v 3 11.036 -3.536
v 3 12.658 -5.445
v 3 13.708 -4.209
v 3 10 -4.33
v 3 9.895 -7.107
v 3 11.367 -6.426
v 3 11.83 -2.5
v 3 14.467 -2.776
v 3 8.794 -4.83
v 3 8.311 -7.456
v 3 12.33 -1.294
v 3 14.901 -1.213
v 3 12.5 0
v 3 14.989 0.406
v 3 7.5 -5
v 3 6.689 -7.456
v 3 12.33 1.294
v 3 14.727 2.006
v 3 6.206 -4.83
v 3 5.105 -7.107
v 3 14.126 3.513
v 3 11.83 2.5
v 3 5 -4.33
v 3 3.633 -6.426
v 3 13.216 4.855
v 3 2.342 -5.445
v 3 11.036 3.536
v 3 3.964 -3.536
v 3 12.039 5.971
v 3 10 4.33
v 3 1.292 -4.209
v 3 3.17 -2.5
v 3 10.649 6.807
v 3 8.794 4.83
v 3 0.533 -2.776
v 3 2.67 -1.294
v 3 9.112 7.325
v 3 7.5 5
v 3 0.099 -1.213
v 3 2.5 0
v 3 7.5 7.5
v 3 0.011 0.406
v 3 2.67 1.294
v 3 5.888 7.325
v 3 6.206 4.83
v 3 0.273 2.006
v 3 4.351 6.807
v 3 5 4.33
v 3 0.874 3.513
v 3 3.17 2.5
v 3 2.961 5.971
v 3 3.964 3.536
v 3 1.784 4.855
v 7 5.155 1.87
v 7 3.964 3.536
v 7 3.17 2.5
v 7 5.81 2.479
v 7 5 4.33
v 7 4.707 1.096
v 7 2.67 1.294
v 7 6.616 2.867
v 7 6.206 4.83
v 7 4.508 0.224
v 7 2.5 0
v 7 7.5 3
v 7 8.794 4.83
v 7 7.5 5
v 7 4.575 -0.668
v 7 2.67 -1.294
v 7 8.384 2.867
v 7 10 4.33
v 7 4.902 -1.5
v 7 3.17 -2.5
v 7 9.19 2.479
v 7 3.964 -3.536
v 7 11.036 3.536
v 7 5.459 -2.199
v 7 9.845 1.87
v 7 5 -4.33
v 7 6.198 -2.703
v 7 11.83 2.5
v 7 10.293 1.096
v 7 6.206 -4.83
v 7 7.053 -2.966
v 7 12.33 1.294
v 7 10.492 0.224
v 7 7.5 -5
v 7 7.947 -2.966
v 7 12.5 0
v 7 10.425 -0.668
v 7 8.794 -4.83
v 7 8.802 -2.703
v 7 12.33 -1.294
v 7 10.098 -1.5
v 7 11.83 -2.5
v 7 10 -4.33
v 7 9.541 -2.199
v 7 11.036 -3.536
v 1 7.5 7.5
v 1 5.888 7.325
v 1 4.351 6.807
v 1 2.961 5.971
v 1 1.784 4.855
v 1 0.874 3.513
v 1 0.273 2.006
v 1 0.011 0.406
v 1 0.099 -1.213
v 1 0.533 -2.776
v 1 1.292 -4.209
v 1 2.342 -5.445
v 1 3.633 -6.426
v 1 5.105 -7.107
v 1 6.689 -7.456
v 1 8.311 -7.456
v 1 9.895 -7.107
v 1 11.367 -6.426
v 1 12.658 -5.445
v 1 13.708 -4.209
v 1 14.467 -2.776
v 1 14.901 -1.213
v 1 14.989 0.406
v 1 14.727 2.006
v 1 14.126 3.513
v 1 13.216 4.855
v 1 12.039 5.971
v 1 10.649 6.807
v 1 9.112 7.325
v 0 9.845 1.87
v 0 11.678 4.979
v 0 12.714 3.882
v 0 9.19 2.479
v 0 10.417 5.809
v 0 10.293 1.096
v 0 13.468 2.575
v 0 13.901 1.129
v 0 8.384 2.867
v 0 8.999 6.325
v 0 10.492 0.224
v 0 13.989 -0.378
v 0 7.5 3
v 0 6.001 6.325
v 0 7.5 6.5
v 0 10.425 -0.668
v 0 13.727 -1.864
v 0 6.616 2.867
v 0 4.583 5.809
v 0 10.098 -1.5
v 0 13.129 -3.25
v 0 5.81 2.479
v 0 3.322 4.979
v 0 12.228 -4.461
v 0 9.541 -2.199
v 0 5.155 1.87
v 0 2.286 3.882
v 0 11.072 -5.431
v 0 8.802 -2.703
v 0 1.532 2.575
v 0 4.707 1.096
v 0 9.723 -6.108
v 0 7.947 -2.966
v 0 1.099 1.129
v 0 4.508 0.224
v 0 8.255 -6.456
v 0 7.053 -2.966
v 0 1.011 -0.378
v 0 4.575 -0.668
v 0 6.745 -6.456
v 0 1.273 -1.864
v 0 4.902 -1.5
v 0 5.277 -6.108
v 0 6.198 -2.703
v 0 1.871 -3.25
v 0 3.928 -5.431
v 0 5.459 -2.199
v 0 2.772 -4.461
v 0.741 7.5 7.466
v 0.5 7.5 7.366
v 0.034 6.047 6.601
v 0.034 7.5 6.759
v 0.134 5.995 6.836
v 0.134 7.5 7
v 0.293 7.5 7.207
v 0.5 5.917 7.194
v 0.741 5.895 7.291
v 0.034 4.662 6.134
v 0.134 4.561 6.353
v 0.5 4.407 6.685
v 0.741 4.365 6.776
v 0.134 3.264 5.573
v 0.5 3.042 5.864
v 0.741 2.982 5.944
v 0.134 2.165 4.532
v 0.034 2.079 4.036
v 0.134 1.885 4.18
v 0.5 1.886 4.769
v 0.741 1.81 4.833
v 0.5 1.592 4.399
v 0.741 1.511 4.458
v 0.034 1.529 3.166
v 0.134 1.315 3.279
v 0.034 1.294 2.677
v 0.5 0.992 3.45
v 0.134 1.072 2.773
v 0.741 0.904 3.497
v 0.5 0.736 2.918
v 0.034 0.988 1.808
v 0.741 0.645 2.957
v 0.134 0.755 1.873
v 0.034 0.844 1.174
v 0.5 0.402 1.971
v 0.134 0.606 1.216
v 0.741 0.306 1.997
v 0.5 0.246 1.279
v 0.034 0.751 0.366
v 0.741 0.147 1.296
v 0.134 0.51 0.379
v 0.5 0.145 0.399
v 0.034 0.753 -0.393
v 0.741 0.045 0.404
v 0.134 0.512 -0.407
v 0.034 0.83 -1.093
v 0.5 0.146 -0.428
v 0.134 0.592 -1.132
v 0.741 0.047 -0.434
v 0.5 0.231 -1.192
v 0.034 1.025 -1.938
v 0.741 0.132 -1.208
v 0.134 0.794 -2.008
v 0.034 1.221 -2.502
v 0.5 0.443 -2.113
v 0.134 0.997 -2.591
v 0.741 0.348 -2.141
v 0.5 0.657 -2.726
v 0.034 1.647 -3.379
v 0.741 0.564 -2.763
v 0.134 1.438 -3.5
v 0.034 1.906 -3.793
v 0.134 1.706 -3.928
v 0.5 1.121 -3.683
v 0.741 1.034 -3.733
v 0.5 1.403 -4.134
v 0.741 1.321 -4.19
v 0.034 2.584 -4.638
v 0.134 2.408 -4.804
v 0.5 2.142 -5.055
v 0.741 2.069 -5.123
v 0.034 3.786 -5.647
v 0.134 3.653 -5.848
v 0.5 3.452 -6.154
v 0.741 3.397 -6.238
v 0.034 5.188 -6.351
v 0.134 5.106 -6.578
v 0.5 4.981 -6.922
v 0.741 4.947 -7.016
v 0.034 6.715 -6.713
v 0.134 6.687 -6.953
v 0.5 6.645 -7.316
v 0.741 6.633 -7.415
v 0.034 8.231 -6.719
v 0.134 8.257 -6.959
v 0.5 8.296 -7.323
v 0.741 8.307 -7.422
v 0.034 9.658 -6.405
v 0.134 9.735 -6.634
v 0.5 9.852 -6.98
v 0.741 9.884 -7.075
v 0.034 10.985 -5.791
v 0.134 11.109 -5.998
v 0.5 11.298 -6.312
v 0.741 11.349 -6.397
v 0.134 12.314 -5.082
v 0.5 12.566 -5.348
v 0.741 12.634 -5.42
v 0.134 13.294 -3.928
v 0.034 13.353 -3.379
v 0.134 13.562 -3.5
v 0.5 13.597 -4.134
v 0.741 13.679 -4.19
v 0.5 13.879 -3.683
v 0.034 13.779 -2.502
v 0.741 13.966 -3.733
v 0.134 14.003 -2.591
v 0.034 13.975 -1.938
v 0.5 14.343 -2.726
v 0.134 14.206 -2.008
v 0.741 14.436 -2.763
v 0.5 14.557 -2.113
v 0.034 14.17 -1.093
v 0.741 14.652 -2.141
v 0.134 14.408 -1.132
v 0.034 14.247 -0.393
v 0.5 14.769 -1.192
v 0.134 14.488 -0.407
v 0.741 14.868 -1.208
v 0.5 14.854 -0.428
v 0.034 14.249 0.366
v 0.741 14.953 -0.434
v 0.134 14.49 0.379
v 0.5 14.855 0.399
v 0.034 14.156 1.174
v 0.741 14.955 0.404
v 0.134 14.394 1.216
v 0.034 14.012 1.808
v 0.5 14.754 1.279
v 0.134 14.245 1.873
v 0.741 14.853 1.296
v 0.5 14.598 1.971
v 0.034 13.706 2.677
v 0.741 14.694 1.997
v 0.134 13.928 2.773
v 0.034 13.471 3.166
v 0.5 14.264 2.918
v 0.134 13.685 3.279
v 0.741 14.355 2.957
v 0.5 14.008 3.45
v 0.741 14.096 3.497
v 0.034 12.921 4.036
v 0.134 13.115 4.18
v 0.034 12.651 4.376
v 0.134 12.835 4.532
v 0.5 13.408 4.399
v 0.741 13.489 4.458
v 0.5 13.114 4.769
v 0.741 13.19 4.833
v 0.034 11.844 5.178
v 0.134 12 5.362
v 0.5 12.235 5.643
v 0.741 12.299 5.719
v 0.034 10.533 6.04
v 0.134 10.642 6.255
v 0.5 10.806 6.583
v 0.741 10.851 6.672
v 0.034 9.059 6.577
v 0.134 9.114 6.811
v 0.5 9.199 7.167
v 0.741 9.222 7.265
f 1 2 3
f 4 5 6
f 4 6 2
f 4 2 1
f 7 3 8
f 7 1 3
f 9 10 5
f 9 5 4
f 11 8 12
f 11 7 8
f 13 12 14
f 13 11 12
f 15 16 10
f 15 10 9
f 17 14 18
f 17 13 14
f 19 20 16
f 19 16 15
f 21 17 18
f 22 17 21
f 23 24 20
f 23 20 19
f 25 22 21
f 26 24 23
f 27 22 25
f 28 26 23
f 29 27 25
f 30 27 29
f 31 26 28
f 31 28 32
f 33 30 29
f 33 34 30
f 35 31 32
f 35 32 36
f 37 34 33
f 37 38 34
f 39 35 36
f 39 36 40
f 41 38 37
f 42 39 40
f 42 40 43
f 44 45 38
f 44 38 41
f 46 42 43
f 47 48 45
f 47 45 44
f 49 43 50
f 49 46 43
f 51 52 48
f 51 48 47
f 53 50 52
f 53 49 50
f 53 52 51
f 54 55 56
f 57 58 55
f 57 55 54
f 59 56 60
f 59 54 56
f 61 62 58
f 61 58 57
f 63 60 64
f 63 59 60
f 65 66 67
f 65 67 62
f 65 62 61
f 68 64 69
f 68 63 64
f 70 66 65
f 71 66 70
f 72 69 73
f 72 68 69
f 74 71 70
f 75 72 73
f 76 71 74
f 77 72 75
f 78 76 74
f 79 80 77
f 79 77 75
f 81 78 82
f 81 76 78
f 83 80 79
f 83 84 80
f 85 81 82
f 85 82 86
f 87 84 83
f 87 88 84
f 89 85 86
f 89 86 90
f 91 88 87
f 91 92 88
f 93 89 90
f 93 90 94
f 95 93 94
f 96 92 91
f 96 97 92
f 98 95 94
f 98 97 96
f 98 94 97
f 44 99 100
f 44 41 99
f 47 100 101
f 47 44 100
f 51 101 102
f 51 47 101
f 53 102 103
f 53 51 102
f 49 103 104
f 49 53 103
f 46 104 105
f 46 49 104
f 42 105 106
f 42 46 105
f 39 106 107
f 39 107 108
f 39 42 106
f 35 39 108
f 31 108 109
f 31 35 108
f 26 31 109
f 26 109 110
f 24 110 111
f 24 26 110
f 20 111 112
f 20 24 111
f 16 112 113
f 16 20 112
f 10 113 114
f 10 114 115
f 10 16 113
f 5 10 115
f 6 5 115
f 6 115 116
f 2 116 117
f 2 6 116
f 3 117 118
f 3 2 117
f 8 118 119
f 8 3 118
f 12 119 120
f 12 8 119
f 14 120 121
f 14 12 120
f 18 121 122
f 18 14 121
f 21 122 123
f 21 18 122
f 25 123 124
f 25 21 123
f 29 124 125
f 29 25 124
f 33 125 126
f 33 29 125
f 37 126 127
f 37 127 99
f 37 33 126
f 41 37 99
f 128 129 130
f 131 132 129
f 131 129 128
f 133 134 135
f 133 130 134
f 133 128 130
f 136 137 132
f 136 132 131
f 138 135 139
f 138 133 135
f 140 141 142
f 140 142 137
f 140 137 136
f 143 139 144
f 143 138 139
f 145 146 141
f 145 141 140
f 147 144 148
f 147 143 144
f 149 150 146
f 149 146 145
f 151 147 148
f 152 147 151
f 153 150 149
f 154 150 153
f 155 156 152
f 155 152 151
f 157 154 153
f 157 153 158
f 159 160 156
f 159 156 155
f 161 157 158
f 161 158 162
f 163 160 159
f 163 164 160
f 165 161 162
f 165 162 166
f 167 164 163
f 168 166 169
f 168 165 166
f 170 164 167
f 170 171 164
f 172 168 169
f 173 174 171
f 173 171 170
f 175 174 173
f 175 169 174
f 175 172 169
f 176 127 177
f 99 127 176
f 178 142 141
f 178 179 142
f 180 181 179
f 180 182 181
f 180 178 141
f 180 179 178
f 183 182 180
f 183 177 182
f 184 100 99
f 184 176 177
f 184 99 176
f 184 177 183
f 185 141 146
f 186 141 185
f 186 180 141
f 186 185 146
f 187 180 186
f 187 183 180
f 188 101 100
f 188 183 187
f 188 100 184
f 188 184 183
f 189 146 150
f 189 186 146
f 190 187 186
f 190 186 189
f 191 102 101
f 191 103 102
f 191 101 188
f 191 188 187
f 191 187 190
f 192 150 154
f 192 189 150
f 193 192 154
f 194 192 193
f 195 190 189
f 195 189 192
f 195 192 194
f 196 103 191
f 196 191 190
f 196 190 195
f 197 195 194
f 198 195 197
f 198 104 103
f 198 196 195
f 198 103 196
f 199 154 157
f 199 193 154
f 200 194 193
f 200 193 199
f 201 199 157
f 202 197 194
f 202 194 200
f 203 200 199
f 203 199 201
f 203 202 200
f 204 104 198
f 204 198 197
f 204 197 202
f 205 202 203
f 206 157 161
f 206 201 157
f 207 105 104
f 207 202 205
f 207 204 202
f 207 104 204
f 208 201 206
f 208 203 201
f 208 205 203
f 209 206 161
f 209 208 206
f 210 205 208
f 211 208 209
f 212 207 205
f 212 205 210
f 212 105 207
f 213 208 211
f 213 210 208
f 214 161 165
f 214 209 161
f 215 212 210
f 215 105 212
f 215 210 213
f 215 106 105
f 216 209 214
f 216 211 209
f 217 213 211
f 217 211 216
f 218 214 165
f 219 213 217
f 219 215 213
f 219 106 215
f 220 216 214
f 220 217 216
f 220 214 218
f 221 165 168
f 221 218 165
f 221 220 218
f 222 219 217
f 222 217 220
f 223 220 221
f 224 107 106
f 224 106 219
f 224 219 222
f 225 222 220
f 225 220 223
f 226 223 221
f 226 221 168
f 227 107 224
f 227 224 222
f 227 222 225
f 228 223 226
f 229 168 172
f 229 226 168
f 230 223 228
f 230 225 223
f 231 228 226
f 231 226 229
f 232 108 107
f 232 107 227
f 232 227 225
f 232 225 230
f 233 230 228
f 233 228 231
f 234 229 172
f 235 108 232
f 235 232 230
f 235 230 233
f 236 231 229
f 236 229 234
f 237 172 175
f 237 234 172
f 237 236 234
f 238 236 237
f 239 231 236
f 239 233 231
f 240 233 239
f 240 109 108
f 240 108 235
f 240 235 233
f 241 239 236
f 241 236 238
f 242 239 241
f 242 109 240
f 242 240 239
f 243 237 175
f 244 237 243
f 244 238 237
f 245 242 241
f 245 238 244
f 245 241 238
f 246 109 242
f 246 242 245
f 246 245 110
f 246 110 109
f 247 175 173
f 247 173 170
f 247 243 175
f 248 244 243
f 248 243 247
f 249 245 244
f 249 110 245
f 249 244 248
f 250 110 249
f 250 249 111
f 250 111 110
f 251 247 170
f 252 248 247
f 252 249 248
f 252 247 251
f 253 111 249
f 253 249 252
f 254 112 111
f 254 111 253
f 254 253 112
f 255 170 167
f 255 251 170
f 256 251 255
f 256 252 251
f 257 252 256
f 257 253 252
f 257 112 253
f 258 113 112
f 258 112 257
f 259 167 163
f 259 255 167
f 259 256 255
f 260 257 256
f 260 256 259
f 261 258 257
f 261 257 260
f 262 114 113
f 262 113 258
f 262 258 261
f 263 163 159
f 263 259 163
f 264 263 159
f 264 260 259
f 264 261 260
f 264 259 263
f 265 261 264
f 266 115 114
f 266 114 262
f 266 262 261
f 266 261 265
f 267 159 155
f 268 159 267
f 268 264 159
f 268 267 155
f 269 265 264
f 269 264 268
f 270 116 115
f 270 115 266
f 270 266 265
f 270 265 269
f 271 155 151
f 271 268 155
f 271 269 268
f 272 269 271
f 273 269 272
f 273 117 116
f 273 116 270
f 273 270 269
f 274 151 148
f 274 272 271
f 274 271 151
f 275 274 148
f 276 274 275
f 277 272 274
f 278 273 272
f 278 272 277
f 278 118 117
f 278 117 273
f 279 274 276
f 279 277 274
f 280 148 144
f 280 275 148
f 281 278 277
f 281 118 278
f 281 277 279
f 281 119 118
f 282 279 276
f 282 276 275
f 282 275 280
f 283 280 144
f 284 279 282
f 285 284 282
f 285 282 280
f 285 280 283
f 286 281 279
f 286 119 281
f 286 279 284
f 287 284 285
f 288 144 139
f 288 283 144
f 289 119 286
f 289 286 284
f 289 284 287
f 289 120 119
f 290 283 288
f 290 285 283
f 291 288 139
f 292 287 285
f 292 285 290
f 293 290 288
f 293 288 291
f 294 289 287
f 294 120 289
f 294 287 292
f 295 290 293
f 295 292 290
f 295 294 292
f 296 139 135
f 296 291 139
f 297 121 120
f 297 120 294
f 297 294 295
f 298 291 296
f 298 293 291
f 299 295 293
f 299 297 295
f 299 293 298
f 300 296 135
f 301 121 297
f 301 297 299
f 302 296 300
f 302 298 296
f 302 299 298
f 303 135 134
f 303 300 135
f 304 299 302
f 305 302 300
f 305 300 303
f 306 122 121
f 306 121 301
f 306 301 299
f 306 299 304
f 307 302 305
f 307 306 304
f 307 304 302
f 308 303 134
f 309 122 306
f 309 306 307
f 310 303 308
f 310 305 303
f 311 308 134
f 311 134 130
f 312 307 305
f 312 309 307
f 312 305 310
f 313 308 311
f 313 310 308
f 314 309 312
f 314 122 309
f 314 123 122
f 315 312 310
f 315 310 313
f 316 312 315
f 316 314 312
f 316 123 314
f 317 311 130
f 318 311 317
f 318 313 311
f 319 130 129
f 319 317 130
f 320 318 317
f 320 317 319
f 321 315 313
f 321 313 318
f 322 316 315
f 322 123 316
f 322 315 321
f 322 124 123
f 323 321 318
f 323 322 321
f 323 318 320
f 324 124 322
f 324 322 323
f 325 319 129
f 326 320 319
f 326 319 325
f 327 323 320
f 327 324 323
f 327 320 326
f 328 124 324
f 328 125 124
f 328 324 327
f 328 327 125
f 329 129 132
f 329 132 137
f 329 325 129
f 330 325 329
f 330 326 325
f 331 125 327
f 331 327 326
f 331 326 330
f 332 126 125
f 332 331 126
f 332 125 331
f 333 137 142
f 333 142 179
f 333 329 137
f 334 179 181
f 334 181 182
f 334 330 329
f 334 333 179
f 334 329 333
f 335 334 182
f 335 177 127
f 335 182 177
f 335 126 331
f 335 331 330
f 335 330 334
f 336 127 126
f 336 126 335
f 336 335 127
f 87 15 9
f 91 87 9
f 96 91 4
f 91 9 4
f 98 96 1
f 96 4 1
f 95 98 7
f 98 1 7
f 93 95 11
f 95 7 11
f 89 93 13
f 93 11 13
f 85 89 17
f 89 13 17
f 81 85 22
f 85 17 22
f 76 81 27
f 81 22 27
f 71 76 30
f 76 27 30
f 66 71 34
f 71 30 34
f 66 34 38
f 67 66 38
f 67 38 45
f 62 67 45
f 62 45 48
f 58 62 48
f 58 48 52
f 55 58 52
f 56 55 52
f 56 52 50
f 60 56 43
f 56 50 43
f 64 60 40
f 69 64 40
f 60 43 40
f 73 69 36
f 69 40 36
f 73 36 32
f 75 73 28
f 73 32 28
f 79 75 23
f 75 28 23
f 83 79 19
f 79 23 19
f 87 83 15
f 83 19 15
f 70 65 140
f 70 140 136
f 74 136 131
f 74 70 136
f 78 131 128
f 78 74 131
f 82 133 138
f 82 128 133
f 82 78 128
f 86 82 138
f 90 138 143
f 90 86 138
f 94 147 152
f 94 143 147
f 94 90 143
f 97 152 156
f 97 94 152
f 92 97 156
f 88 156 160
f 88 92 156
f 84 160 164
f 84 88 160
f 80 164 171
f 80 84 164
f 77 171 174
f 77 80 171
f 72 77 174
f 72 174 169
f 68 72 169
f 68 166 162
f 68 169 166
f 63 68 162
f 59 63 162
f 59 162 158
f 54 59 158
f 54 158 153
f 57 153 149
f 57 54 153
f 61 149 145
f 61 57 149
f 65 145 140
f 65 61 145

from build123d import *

# Parameters (mm, degrees)
SKETCH2_R               = 5
BOSS_EXTRUDE1_DEPTH     = 4
CUT_EXTRUDE1_DEPTH      = 19.172781887
CUT_EXTRUDE1_DEPTH_BACK = 19.172781887
SKETCH3_R               = 3


with BuildPart() as part:
    # Sketch1 → Revolve1 (revolve)
    with BuildSketch(Plane.XY, mode=Mode.PRIVATE) as revolve1_sk:
        with BuildLine():
            Line((1, 0), (3, 0))
            Line((3, 0), (3, 7.5))
            Line((3, 7.5), (0, 7.5))
            Line((0, 7.5), (0, 1))
            ThreePointArc((0, 1), (0.292893219, 0.292893219), (1, 0))
        make_face()
    revolve(revolve1_sk.sketch.rotate(Axis((0, 7.5, 0), (1, 0, 0)), 270), axis=Axis((0, 7.5, 0), (1, 0, 0)))

    # Sketch2 → Boss-Extrude1 (add)
    with BuildSketch(Plane(origin=(3, 0, 0), x_dir=(0, 0, -1), z_dir=(1, 0, 0))):
        with Locations((0, 7.5)):
            Circle(SKETCH2_R)
    extrude(amount=BOSS_EXTRUDE1_DEPTH)

    # Sketch3 → Cut-Extrude1 (cut, two sides: drawn at the far end of the back side and taken through both)
    with BuildSketch(Plane.ZY.offset(-CUT_EXTRUDE1_DEPTH_BACK)):
        with Locations((0, 7.5)):
            Circle(SKETCH3_R)
    extrude(amount=CUT_EXTRUDE1_DEPTH + CUT_EXTRUDE1_DEPTH_BACK, mode=Mode.SUBTRACT)


solid = part.part
